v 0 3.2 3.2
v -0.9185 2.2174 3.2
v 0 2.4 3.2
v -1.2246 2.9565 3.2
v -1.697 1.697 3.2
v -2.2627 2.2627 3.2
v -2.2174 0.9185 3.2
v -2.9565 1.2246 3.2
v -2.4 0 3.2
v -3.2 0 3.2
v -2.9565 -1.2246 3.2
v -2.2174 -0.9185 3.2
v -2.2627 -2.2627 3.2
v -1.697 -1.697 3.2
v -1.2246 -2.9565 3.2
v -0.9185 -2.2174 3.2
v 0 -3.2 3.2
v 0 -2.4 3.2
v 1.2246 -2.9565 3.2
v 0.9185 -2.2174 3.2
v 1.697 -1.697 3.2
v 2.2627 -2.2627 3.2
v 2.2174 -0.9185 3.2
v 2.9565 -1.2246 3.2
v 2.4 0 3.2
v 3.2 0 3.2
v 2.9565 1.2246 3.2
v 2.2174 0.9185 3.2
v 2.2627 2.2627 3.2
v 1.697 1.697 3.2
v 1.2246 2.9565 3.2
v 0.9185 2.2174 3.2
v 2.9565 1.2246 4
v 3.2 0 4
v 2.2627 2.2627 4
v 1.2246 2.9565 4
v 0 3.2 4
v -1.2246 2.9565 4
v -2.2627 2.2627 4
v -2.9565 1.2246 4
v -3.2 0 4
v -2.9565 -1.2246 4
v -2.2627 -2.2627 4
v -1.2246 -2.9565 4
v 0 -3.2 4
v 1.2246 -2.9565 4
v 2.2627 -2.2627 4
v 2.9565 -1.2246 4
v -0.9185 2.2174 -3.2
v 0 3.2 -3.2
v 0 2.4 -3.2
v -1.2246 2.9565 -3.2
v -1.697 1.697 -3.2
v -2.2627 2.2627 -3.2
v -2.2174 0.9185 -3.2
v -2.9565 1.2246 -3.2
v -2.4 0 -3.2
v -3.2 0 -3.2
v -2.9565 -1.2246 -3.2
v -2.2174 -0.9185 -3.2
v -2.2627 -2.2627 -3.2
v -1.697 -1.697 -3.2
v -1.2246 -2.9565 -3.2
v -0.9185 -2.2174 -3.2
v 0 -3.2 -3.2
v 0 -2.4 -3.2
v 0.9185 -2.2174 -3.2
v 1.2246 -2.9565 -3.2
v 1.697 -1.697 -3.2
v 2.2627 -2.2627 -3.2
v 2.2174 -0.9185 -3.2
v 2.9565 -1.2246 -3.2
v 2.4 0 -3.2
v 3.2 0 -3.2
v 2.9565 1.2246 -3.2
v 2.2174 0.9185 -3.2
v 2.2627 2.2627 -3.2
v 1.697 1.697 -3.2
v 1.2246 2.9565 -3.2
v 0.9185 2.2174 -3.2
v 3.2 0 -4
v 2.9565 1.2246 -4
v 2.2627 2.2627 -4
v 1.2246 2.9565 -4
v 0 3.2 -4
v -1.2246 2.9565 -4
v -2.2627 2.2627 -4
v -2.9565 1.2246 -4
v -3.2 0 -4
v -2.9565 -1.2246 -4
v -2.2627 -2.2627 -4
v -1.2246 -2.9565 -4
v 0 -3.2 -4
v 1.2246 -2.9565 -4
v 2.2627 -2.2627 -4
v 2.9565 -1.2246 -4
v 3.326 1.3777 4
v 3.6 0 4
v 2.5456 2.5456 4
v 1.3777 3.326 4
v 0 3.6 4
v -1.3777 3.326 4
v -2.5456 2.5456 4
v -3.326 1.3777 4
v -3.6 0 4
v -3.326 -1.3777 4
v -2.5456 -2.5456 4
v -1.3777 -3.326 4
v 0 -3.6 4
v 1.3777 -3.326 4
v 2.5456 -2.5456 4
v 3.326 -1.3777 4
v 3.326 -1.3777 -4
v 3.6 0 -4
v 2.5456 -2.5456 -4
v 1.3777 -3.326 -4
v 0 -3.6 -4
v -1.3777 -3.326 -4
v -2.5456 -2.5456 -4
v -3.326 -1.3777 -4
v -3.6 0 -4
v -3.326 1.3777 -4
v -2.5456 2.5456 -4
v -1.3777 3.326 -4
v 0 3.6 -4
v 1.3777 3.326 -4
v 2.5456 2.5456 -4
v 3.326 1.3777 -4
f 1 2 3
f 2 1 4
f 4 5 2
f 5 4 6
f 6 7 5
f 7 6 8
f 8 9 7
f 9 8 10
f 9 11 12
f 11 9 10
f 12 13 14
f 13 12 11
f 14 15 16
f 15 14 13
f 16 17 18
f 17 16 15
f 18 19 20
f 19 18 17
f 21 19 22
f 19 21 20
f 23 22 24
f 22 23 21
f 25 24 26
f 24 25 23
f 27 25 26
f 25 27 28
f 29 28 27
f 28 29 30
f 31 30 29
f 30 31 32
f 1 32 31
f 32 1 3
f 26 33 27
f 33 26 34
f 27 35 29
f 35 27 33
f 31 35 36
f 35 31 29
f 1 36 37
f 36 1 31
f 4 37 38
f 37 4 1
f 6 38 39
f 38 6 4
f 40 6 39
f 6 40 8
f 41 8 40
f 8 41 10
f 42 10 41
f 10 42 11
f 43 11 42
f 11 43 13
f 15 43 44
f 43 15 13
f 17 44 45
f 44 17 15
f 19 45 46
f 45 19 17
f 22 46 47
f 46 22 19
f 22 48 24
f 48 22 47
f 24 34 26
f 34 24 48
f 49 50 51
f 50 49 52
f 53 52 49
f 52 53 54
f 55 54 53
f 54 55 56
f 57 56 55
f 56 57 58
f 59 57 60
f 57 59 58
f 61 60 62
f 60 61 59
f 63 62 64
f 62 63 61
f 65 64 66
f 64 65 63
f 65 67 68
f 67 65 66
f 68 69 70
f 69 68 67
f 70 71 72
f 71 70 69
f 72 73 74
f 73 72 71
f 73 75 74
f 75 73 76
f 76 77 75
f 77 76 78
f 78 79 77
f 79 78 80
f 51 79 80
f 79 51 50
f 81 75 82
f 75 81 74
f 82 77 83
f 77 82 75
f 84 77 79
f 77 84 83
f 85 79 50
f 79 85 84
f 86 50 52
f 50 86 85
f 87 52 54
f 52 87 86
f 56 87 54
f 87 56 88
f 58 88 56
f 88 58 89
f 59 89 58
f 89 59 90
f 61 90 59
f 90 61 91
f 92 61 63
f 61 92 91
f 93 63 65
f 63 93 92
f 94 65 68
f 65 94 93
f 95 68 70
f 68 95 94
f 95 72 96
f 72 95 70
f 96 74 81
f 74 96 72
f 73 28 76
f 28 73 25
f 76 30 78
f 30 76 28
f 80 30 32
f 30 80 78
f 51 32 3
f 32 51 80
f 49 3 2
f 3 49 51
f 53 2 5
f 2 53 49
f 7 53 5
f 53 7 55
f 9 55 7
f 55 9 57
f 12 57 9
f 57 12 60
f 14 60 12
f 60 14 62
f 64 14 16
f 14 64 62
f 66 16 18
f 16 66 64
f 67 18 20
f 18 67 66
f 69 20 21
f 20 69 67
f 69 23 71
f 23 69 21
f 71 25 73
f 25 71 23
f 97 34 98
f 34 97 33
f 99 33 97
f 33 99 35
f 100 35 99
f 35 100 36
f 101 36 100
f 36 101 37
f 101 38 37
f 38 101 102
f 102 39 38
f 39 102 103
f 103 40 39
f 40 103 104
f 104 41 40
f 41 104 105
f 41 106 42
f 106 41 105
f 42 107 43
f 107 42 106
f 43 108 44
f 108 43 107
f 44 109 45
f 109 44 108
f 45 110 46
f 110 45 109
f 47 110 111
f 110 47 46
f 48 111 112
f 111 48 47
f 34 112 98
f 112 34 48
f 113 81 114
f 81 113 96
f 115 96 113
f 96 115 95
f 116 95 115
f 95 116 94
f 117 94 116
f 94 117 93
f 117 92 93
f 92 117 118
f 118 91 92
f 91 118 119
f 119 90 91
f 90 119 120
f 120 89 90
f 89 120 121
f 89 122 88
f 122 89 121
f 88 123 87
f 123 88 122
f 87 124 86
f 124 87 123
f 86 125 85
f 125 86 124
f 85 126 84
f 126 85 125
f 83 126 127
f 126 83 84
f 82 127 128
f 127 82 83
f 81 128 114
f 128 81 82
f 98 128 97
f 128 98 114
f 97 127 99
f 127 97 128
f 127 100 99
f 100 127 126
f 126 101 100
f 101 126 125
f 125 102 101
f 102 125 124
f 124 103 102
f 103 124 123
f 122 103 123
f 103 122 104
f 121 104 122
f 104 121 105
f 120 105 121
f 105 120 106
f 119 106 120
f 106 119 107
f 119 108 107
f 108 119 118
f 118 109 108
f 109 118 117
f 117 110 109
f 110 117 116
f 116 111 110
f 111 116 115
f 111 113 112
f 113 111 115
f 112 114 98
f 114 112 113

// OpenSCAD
// file: ../p/4-4disc.scad
use <../lib.scad>
$fa=1; $fs=0.2;
function ldraw_lib__4_4disc(realsolid=false) = [
// 0 Disc 1.0
// 0 Name: 4-4disc.dat
// 0 Author: James Jessiman
// 0 !LDRAW_ORG Primitive UPDATE 2002-02
// 0 !LICENSE Licensed under CC BY 2.0 and CC BY 4.0 : see CAreadme.txt
// 
// 0 BFC CERTIFY CCW
  [0,"BFC","CERTIFY"],
  [0,"BFC","CCW"],
// 
// 0 !HISTORY 1998-12-15 [PTadmin] Official Update 1998-10
// 0 !HISTORY 2002-03-23 [sbliss] Added BFC statement
// 0 !HISTORY 2002-04-25 [PTadmin] Official Update 2002-02
// 0 !HISTORY 2007-06-24 [PTadmin] Header formatted for Contributor Agreement
// 0 !HISTORY 2008-07-01 [PTadmin] Official Update 2008-01
// 
// 
// 3 16 0 0 0 1 0 0 0.9239 0 0.3827
  [3,16,0,0,0,1,0,0,0.9239,0,0.3827],
// 3 16 0 0 0 0.9239 0 0.3827 0.7071 0 0.7071
  [3,16,0,0,0,0.9239,0,0.3827,0.7071,0,0.7071],
// 3 16 0 0 0 0.7071 0 0.7071 0.3827 0 0.9239
  [3,16,0,0,0,0.7071,0,0.7071,0.3827,0,0.9239],
// 3 16 0 0 0 0.3827 0 0.9239 0 0 1
  [3,16,0,0,0,0.3827,0,0.9239,0,0,1],
// 3 16 0 0 0 0 0 1 -0.3827 0 0.9239
  [3,16,0,0,0,0,0,1,-0.3827,0,0.9239],
// 3 16 0 0 0 -0.3827 0 0.9239 -0.7071 0 0.7071
  [3,16,0,0,0,-0.3827,0,0.9239,-0.7071,0,0.7071],
// 3 16 0 0 0 -0.7071 0 0.7071 -0.9239 0 0.3827
  [3,16,0,0,0,-0.7071,0,0.7071,-0.9239,0,0.3827],
// 3 16 0 0 0 -0.9239 0 0.3827 -1 0 -0
  [3,16,0,0,0,-0.9239,0,0.3827,-1,0,-0],
// 3 16 0 0 0 -1 0 -0 -0.9239 0 -0.3827
  [3,16,0,0,0,-1,0,-0,-0.9239,0,-0.3827],
// 3 16 0 0 0 -0.9239 0 -0.3827 -0.7071 0 -0.7071
  [3,16,0,0,0,-0.9239,0,-0.3827,-0.7071,0,-0.7071],
// 3 16 0 0 0 -0.7071 0 -0.7071 -0.3827 0 -0.9239
  [3,16,0,0,0,-0.7071,0,-0.7071,-0.3827,0,-0.9239],
// 3 16 0 0 0 -0.3827 0 -0.9239 0 0 -1
  [3,16,0,0,0,-0.3827,0,-0.9239,0,0,-1],
// 3 16 0 0 0 0 0 -1 0.3827 0 -0.9239
  [3,16,0,0,0,0,0,-1,0.3827,0,-0.9239],
// 3 16 0 0 0 0.3827 0 -0.9239 0.7071 0 -0.7071
  [3,16,0,0,0,0.3827,0,-0.9239,0.7071,0,-0.7071],
// 3 16 0 0 0 0.7071 0 -0.7071 0.9239 0 -0.3827
  [3,16,0,0,0,0.7071,0,-0.7071,0.9239,0,-0.3827],
// 3 16 0 0 0 0.9239 0 -0.3827 1 0 0
  [3,16,0,0,0,0.9239,0,-0.3827,1,0,0],
// 0
];
module ldraw_lib__4_4disc(step=0, col=false, unit=2/5, alt=false, line=0.2, solid=!$preview)
    makepoly(ldraw_lib__4_4disc(solid), step=step, col=col, unit=unit, alt=alt, line=line, solid=solid);
ldraw_lib__4_4disc(line=0.2);
// file: ../p/stud3.scad
use <../lib.scad>
use <4-4cyli.scad>
use <4-4disc.scad>
use <4-4edge.scad>
$fa=1; $fs=0.2;
function ldraw_lib__stud3(realsolid=false) = realsolid ? 
    [openscad(translate([0,0,-eps()], o=cylinder(4+eps(), r=4)),2)] : [
// 0 Stud Tube Solid
// 0 Name: stud3.dat
// 0 Author: James Jessiman
// 0 !LDRAW_ORG Primitive UPDATE 2012-01
// 0 !LICENSE Licensed under CC BY 2.0 and CC BY 4.0 : see CAreadme.txt
// 
// 0 BFC CERTIFY CCW
  [0,"BFC","CERTIFY"],
  [0,"BFC","CCW"],
// 
// 0 !HISTORY 2002-04-04 [sbliss] Modified for BFC compliance
// 0 !HISTORY 2002-04-25 [PTadmin] Official Update 2002-02
// 0 !HISTORY 2007-06-24 [PTadmin] Header formatted for Contributor Agreement
// 0 !HISTORY 2008-07-01 [PTadmin] Official Update 2008-01
// 0 !HISTORY 2012-02-16 [Philo] Changed to CCW
// 0 !HISTORY 2012-03-30 [PTadmin] Official Update 2012-01
// 
// 
// 1 16 0 -4 0 4 0 0 0 1 0 0 0 4 4-4edge.dat
  [1,16,0,-4,0,4,0,0,0,1,0,0,0,4, ldraw_lib__4_4edge(realsolid)],
// 1 16 0 0 0 4 0 0 0 1 0 0 0 4 4-4edge.dat
  [1,16,0,0,0,4,0,0,0,1,0,0,0,4, ldraw_lib__4_4edge(realsolid)],
// 1 16 0 -4 0 4 0 0 0 1 0 0 0 4 4-4disc.dat
  [1,16,0,-4,0,4,0,0,0,1,0,0,0,4, ldraw_lib__4_4disc(realsolid)],
// 1 16 0 -4 0 4 0 0 0 4 0 0 0 4 4-4cyli.dat
  [1,16,0,-4,0,4,0,0,0,4,0,0,0,4, ldraw_lib__4_4cyli(realsolid)],
];
module ldraw_lib__stud3(step=0, col=false, unit=2/5, alt=false, line=0.2, solid=!$preview)
    makepoly(ldraw_lib__stud3(solid), step=step, col=col, unit=unit, alt=alt, line=line, solid=solid);
ldraw_lib__stud3(line=0.2);
// file: ../p/stud.scad
use <../lib.scad>
use <4-4cyli.scad>
use <4-4disc.scad>
use <4-4edge.scad>
$fa=1; $fs=0.2;
function ldraw_lib__stud(realsolid=false) = realsolid ? 
    [openscad(translate([0,0,-eps()], o=cylinder(4+eps(), r=6)),2)] : [
// 0 Stud
// 0 Name: stud.dat
// 0 Author: James Jessiman
// 0 !LDRAW_ORG Primitive UPDATE 2012-01
// 0 !LICENSE Licensed under CC BY 2.0 and CC BY 4.0 : see CAreadme.txt
// 
// 0 BFC CERTIFY CCW
  [0,"BFC","CERTIFY"],
  [0,"BFC","CCW"],
// 
// 0 !HISTORY 2002-04-04 [sbliss] Modified for BFC compliance
// 0 !HISTORY 2002-04-25 [PTadmin] Official Update 2002-02
// 0 !HISTORY 2007-06-24 [PTadmin] Header formatted for Contributor Agreement
// 0 !HISTORY 2008-07-01 [PTadmin] Official Update 2008-01
// 0 !HISTORY 2012-02-16 [Philo] Changed to CCW
// 0 !HISTORY 2012-03-30 [PTadmin] Official Update 2012-01
// 
// 
// 1 16 0 0 0 6 0 0 0 1 0 0 0 6 4-4edge.dat
  [1,16,0,0,0,6,0,0,0,1,0,0,0,6, ldraw_lib__4_4edge(realsolid)],
// 1 16 0 -4 0 6 0 0 0 1 0 0 0 6 4-4edge.dat
  [1,16,0,-4,0,6,0,0,0,1,0,0,0,6, ldraw_lib__4_4edge(realsolid)],
// 1 16 0 0 0 6 0 0 0 -4 0 0 0 6 4-4cyli.dat
  [1,16,0,0,0,6,0,0,0,-4,0,0,0,6, ldraw_lib__4_4cyli(realsolid)],
// 1 16 0 -4 0 6 0 0 0 1 0 0 0 6 4-4disc.dat
  [1,16,0,-4,0,6,0,0,0,1,0,0,0,6, ldraw_lib__4_4disc(realsolid)],
];
module ldraw_lib__stud(step=0, col=false, unit=2/5, alt=false, line=0.2, solid=!$preview)
    makepoly(ldraw_lib__stud(solid), step=step, col=col, unit=unit, alt=alt, line=line, solid=solid);
ldraw_lib__stud(line=0.2);
// file: ../p/box5.scad
use <../lib.scad>
$fa=1; $fs=0.2;
function ldraw_lib__box5(realsolid=false) = [
// 0 Box with 5 Faces and All Edges
// 0 Name: box5.dat
// 0 Author: James Jessiman
// 0 !LDRAW_ORG Primitive UPDATE 2012-01
// 0 !LICENSE Licensed under CC BY 2.0 and CC BY 4.0 : see CAreadme.txt
// 
// 0 BFC CERTIFY CCW
  [0,"BFC","CERTIFY"],
  [0,"BFC","CCW"],
// 
// 0 !HISTORY 2002-04-03 [sbliss] Modified for BFC compliance
// 0 !HISTORY 2002-04-25 [PTadmin] Official Update 2002-02
// 0 !HISTORY 2007-06-24 [PTadmin] Header formatted for Contributor Agreement
// 0 !HISTORY 2008-07-01 [PTadmin] Official Update 2008-01
// 0 !HISTORY 2012-02-16 [Philo] Changed to CCW
// 0 !HISTORY 2012-03-30 [PTadmin] Official Update 2012-01
// 
// 
// 2 24 1 1 1 -1 1 1
  [2,24,1,1,1,-1,1,1],
// 2 24 -1 1 1 -1 1 -1
  [2,24,-1,1,1,-1,1,-1],
// 2 24 -1 1 -1 1 1 -1
  [2,24,-1,1,-1,1,1,-1],
// 2 24 1 1 -1 1 1 1
  [2,24,1,1,-1,1,1,1],
// 2 24 1 0 1 -1 0 1
  [2,24,1,0,1,-1,0,1],
// 2 24 -1 0 1 -1 0 -1
  [2,24,-1,0,1,-1,0,-1],
// 2 24 -1 0 -1 1 0 -1
  [2,24,-1,0,-1,1,0,-1],
// 2 24 1 0 -1 1 0 1
  [2,24,1,0,-1,1,0,1],
// 2 24 1 0 1 1 1 1
  [2,24,1,0,1,1,1,1],
// 2 24 -1 0 1 -1 1 1
  [2,24,-1,0,1,-1,1,1],
// 2 24 1 0 -1 1 1 -1
  [2,24,1,0,-1,1,1,-1],
// 2 24 -1 0 -1 -1 1 -1
  [2,24,-1,0,-1,-1,1,-1],
// 4 16 -1 1 1 1 1 1 1 1 -1 -1 1 -1
  [4,16,-1,1,1,1,1,1,1,1,-1,-1,1,-1],
// 4 16 -1 1 1 -1 0 1 1 0 1 1 1 1
  [4,16,-1,1,1,-1,0,1,1,0,1,1,1,1],
// 4 16 -1 1 -1 -1 0 -1 -1 0 1 -1 1 1
  [4,16,-1,1,-1,-1,0,-1,-1,0,1,-1,1,1],
// 4 16 1 1 -1 1 0 -1 -1 0 -1 -1 1 -1
  [4,16,1,1,-1,1,0,-1,-1,0,-1,-1,1,-1],
// 4 16 1 1 1 1 0 1 1 0 -1 1 1 -1
  [4,16,1,1,1,1,0,1,1,0,-1,1,1,-1],
];
module ldraw_lib__box5(step=0, col=false, unit=2/5, alt=false, line=0.2, solid=!$preview)
    makepoly(ldraw_lib__box5(solid), step=step, col=col, unit=unit, alt=alt, line=line, solid=solid);
ldraw_lib__box5(line=0.2);
// file: ../p/box4t.scad
use <../lib.scad>
$fa=1; $fs=0.2;
function ldraw_lib__box4t(realsolid=false) = [
// 0 Box with 4 Adjacent Faces and All Edges
// 0 Name: box4t.dat
// 0 Author: Tore Eriksson [Tore_Eriksson]
// 0 !LDRAW_ORG Primitive UPDATE 2003-02
// 0 !LICENSE Licensed under CC BY 2.0 and CC BY 4.0 : see CAreadme.txt
// 
// 0 BFC CERTIFY CCW
  [0,"BFC","CERTIFY"],
  [0,"BFC","CCW"],
// 
// 0 !HISTORY 1997-09-29 [PTadmin] Official Update 1997-15
// 0 !HISTORY 2002-08-31 [izanette] Modified with WINDZ for BFC compliance
// 0 !HISTORY 2003-08-01 [PTadmin] Official Update 2003-02
// 0 !HISTORY 2007-06-24 [PTadmin] Header formatted for Contributor Agreement
// 0 !HISTORY 2008-07-01 [PTadmin] Official Update 2008-01
// 
// 
// 2 24 1 1 1 -1 1 1
  [2,24,1,1,1,-1,1,1],
// 2 24 -1 1 1 -1 1 -1
  [2,24,-1,1,1,-1,1,-1],
// 2 24 -1 1 -1 1 1 -1
  [2,24,-1,1,-1,1,1,-1],
// 2 24 1 1 -1 1 1 1
  [2,24,1,1,-1,1,1,1],
// 2 24 1 0 1 -1 0 1
  [2,24,1,0,1,-1,0,1],
// 2 24 -1 0 1 -1 0 -1
  [2,24,-1,0,1,-1,0,-1],
// 2 24 -1 0 -1 1 0 -1
  [2,24,-1,0,-1,1,0,-1],
// 2 24 1 0 -1 1 0 1
  [2,24,1,0,-1,1,0,1],
// 2 24 1 0 1 1 1 1
  [2,24,1,0,1,1,1,1],
// 2 24 -1 0 1 -1 1 1
  [2,24,-1,0,1,-1,1,1],
// 2 24 1 0 -1 1 1 -1
  [2,24,1,0,-1,1,1,-1],
// 2 24 -1 0 -1 -1 1 -1
  [2,24,-1,0,-1,-1,1,-1],
// 4 16 1 1 1 1 1 -1 -1 1 -1 -1 1 1
  [4,16,1,1,1,1,1,-1,-1,1,-1,-1,1,1],
// 4 16 1 1 1 -1 1 1 -1 0 1 1 0 1
  [4,16,1,1,1,-1,1,1,-1,0,1,1,0,1],
// 4 16 -1 1 1 -1 1 -1 -1 0 -1 -1 0 1
  [4,16,-1,1,1,-1,1,-1,-1,0,-1,-1,0,1],
// 0 4 16 -1 1 -1 -1 0 -1 1 0 -1 1 1 -1
// 4 16 1 1 -1 1 1 1 1 0 1 1 0 -1
  [4,16,1,1,-1,1,1,1,1,0,1,1,0,-1],
// 0
];
module ldraw_lib__box4t(step=0, col=false, unit=2/5, alt=false, line=0.2, solid=!$preview)
    makepoly(ldraw_lib__box4t(solid), step=step, col=col, unit=unit, alt=alt, line=line, solid=solid);
ldraw_lib__box4t(line=0.2);
// file: ../p/4-4ring3.scad
use <../lib.scad>
$fa=1; $fs=0.2;
function ldraw_lib__4_4ring3(realsolid=false) = [
// 0 Ring  3 x 1.0
// 0 Name: 4-4ring3.dat
// 0 Author: James Jessiman
// 0 !LDRAW_ORG Primitive UPDATE 2009-01
// 0 !LICENSE Licensed under CC BY 2.0 and CC BY 4.0 : see CAreadme.txt
// 
// 0 BFC CERTIFY CCW
  [0,"BFC","CERTIFY"],
  [0,"BFC","CCW"],
// 
// 0 !HISTORY 1998-12-15 [PTadmin] Official Update 1998-10
// 0 !HISTORY 2002-04-05 [hafhead] Added BFC statement
// 0 !HISTORY 2002-04-25 [PTadmin] Official Update 2002-02
// 0 !HISTORY 2007-06-24 [PTadmin] Header formatted for Contributor Agreement
// 0 !HISTORY 2008-07-01 [PTadmin] Official Update 2008-01
// 0 !HISTORY 2008-08-26 [cwdee] Switch polygon winding and rename
// 0 !HISTORY 2009-05-02 [PTadmin] Official Update 2009-01
// 
// 
// 4 16 -1.5308 0 3.6956 -1.1481 0 2.7717 0 0 3 0 0 4
  [4,16,-1.5308,0,3.6956,-1.1481,0,2.7717,0,0,3,0,0,4],
// 4 16 -2.8284 0 2.8284 -2.1213 0 2.1213 -1.1481 0 2.7717 -1.5308 0 3.6956
  [4,16,-2.8284,0,2.8284,-2.1213,0,2.1213,-1.1481,0,2.7717,-1.5308,0,3.6956],
// 4 16 -3.6956 0 1.5308 -2.7717 0 1.1481 -2.1213 0 2.1213 -2.8284 0 2.8284
  [4,16,-3.6956,0,1.5308,-2.7717,0,1.1481,-2.1213,0,2.1213,-2.8284,0,2.8284],
// 4 16 -4 0 0 -3 0 0 -2.7717 0 1.1481 -3.6956 0 1.5308
  [4,16,-4,0,0,-3,0,0,-2.7717,0,1.1481,-3.6956,0,1.5308],
// 4 16 -3.6956 0 -1.5308 -2.7717 0 -1.1481 -3 0 0 -4 0 0
  [4,16,-3.6956,0,-1.5308,-2.7717,0,-1.1481,-3,0,0,-4,0,0],
// 4 16 -2.8284 0 -2.8284 -2.1213 0 -2.1213 -2.7717 0 -1.1481 -3.6956 0 -1.5308
  [4,16,-2.8284,0,-2.8284,-2.1213,0,-2.1213,-2.7717,0,-1.1481,-3.6956,0,-1.5308],
// 4 16 -1.5308 0 -3.6956 -1.1481 0 -2.7717 -2.1213 0 -2.1213 -2.8284 0 -2.8284
  [4,16,-1.5308,0,-3.6956,-1.1481,0,-2.7717,-2.1213,0,-2.1213,-2.8284,0,-2.8284],
// 4 16 0 0 -4 0 0 -3 -1.1481 0 -2.7717 -1.5308 0 -3.6956
  [4,16,0,0,-4,0,0,-3,-1.1481,0,-2.7717,-1.5308,0,-3.6956],
// 4 16 1.5308 0 -3.6956 1.1481 0 -2.7717 0 0 -3 0 0 -4
  [4,16,1.5308,0,-3.6956,1.1481,0,-2.7717,0,0,-3,0,0,-4],
// 4 16 2.8284 0 -2.8284 2.1213 0 -2.1213 1.1481 0 -2.7717 1.5308 0 -3.6956
  [4,16,2.8284,0,-2.8284,2.1213,0,-2.1213,1.1481,0,-2.7717,1.5308,0,-3.6956],
// 4 16 3.6956 0 -1.5308 2.7717 0 -1.1481 2.1213 0 -2.1213 2.8284 0 -2.8284
  [4,16,3.6956,0,-1.5308,2.7717,0,-1.1481,2.1213,0,-2.1213,2.8284,0,-2.8284],
// 4 16 4 0 0 3 0 0 2.7717 0 -1.1481 3.6956 0 -1.5308
  [4,16,4,0,0,3,0,0,2.7717,0,-1.1481,3.6956,0,-1.5308],
// 4 16 3.6956 0 1.5308 2.7717 0 1.1481 3 0 0 4 0 0
  [4,16,3.6956,0,1.5308,2.7717,0,1.1481,3,0,0,4,0,0],
// 4 16 2.8284 0 2.8284 2.1213 0 2.1213 2.7717 0 1.1481 3.6956 0 1.5308
  [4,16,2.8284,0,2.8284,2.1213,0,2.1213,2.7717,0,1.1481,3.6956,0,1.5308],
// 4 16 1.5308 0 3.6956 1.1481 0 2.7717 2.1213 0 2.1213 2.8284 0 2.8284
  [4,16,1.5308,0,3.6956,1.1481,0,2.7717,2.1213,0,2.1213,2.8284,0,2.8284],
// 4 16 0 0 4 0 0 3 1.1481 0 2.7717 1.5308 0 3.6956
  [4,16,0,0,4,0,0,3,1.1481,0,2.7717,1.5308,0,3.6956],
// 0
];
module ldraw_lib__4_4ring3(step=0, col=false, unit=2/5, alt=false, line=0.2, solid=!$preview)
    makepoly(ldraw_lib__4_4ring3(solid), step=step, col=col, unit=unit, alt=alt, line=line, solid=solid);
ldraw_lib__4_4ring3(line=0.2);
// file: s/3004s01.scad
use <../../lib.scad>
use <../../p/box4t.scad>
use <../../p/box5.scad>
use <../../p/stud.scad>
use <../../p/stud3.scad>
$fa=1; $fs=0.2;
function ldraw_lib__s__3004s01(realsolid=false) = [
// 0 ~Brick  1 x  2 without Front Face
// 0 Name: s\3004s01.dat
// 0 Author: James Jessiman
// 0 !LDRAW_ORG Subpart UPDATE 2003-03
// 0 !LICENSE Licensed under CC BY 2.0 and CC BY 4.0 : see CAreadme.txt
// 
// 0 BFC CERTIFY CCW
  [0,"BFC","CERTIFY"],
  [0,"BFC","CCW"],
// 
// 0 !HISTORY 2003-09-07 [jriley] Subfiling, BFC
// 0 !HISTORY 2003-12-19 [PTadmin] Official Update 2003-03
// 0 !HISTORY 2007-08-29 [PTadmin] Header formatted for Contributor Agreement
// 0 !HISTORY 2008-07-01 [PTadmin] Official Update 2008-01
// 
// 
// 1 16 0 4 0 1 0 0 0 -5 0 0 0 1 stud3.dat
  [1,16,0,4,0,1,0,0,0,-5,0,0,0,1, ldraw_lib__stud3(realsolid)],
// 0 BFC INVERTNEXT
  [0,"BFC","INVERTNEXT"],
// 1 16 0 24 0 16 0 0 0 -20 0 0 0 6 box5.dat
  [1,16,0,24,0,16,0,0,0,-20,0,0,0,6, ldraw_lib__box5(realsolid)],
// 4 16 20 24 10 16 24 6 -16 24 6 -20 24 10
  [4,16,20,24,10,16,24,6,-16,24,6,-20,24,10],
// 4 16 -20 24 10 -16 24 6 -16 24 -6 -20 24 -10
  [4,16,-20,24,10,-16,24,6,-16,24,-6,-20,24,-10],
// 4 16 -20 24 -10 -16 24 -6 16 24 -6 20 24 -10
  [4,16,-20,24,-10,-16,24,-6,16,24,-6,20,24,-10],
// 4 16 20 24 -10 16 24 -6 16 24 6 20 24 10
  [4,16,20,24,-10,16,24,-6,16,24,6,20,24,10],
// 1 16 0 24 0 20 0 0 0 -24 0 0 0 10 box4t.dat
  [1,16,0,24,0,20,0,0,0,-24,0,0,0,10, ldraw_lib__box4t(realsolid)],
// 1 16 10 0 0 1 0 0 0 1 0 0 0 1 stud.dat
  [1,16,10,0,0,1,0,0,0,1,0,0,0,1, ldraw_lib__stud(realsolid)],
// 1 16 -10 0 0 1 0 0 0 1 0 0 0 1 stud.dat
  [1,16,-10,0,0,1,0,0,0,1,0,0,0,1, ldraw_lib__stud(realsolid)],
// 0
];
module ldraw_lib__s__3004s01(step=0, col=false, unit=2/5, alt=false, line=0.2, solid=!$preview)
    makepoly(ldraw_lib__s__3004s01(solid), step=step, col=col, unit=unit, alt=alt, line=line, solid=solid);
ldraw_lib__s__3004s01(line=0.2);
// file: ../p/peghole.scad
use <../lib.scad>
use <4-4cyli.scad>
use <4-4edge.scad>
use <4-4ring3.scad>
$fa=1; $fs=0.2;
function ldraw_lib__peghole(realsolid=false) = [
// 0 Peg Hole End
// 0 Name: peghole.dat
// 0 Author: James Jessiman
// 0 !LDRAW_ORG Primitive UPDATE 2010-01
// 0 !LICENSE Licensed under CC BY 2.0 and CC BY 4.0 : see CAreadme.txt
// 
// 0 BFC CERTIFY CCW
  [0,"BFC","CERTIFY"],
  [0,"BFC","CCW"],
// 
// 0 !HISTORY 2002-05-01 [mkennedy] replace code with ring3
// 0 !HISTORY 2002-05-01 [sbliss] BFC
// 0 !HISTORY 2002-06-11 [PTadmin] Official Update 2002-03
// 0 !HISTORY 2007-06-24 [PTadmin] Header formatted for Contributor Agreement
// 0 !HISTORY 2008-07-01 [PTadmin] Official Update 2008-01
// 0 !HISTORY 2010-01-14 [cwdee] Update ring3 to 4-4ring3
// 0 !HISTORY 2010-04-05 [PTadmin] Official Update 2010-01
// 
// 
// 1 16 0 0 0 8 0 0 0 1 0 0 0 8 4-4edge.dat
  [1,16,0,0,0,8,0,0,0,1,0,0,0,8, ldraw_lib__4_4edge(realsolid)],
// 1 16 0 2 0 8 0 0 0 1 0 0 0 8 4-4edge.dat
  [1,16,0,2,0,8,0,0,0,1,0,0,0,8, ldraw_lib__4_4edge(realsolid)],
// 1 16 0 2 0 6 0 0 0 1 0 0 0 6 4-4edge.dat
  [1,16,0,2,0,6,0,0,0,1,0,0,0,6, ldraw_lib__4_4edge(realsolid)],
// 1 16 0 2 0 2 0 0 0 1 0 0 0 2 4-4ring3.dat
  [1,16,0,2,0,2,0,0,0,1,0,0,0,2, ldraw_lib__4_4ring3(realsolid)],
// 0 BFC INVERTNEXT
  [0,"BFC","INVERTNEXT"],
// 1 16 0 0 0 8 0 0 0 2 0 0 0 8 4-4cyli.dat
  [1,16,0,0,0,8,0,0,0,2,0,0,0,8, ldraw_lib__4_4cyli(realsolid)],
// 0
];
module ldraw_lib__peghole(step=0, col=false, unit=2/5, alt=false, line=0.2, solid=!$preview)
    makepoly(ldraw_lib__peghole(solid), step=step, col=col, unit=unit, alt=alt, line=line, solid=solid);
ldraw_lib__peghole(line=0.2);
// file: ../p/4-4ring8.scad
use <../lib.scad>
$fa=1; $fs=0.2;
function ldraw_lib__4_4ring8(realsolid=false) = [
// 0 Ring  8 x 1.0
// 0 Name: 4-4ring8.dat
// 0 Author: Steffen [Steffen]
// 0 !LDRAW_ORG Primitive UPDATE 2012-01
// 0 !LICENSE Licensed under CC BY 2.0 and CC BY 4.0 : see CAreadme.txt
// 
// 0 BFC CERTIFY CCW
  [0,"BFC","CERTIFY"],
  [0,"BFC","CCW"],
// 
// 0 !HISTORY 2003-12-19 [PTadmin] Official Update 2003-03
// 0 !HISTORY 2007-06-24 [PTadmin] Header formatted for Contributor Agreement
// 0 !HISTORY 2008-07-01 [PTadmin] Official Update 2008-01
// 0 !HISTORY 2012-02-16 [Philo] Changed to CCW
// 0 !HISTORY 2012-03-30 [PTadmin] Official Update 2012-01
// 
// 
// 4 16 9 0 0 8.3151 0 3.4443 7.3912 0 3.0616 8 0 0
  [4,16,9,0,0,8.3151,0,3.4443,7.3912,0,3.0616,8,0,0],
// 4 16 8.3151 0 3.4443 6.3639 0 6.3639 5.6568 0 5.6568 7.3912 0 3.0616
  [4,16,8.3151,0,3.4443,6.3639,0,6.3639,5.6568,0,5.6568,7.3912,0,3.0616],
// 4 16 6.3639 0 6.3639 3.4443 0 8.3151 3.0616 0 7.3912 5.6568 0 5.6568
  [4,16,6.3639,0,6.3639,3.4443,0,8.3151,3.0616,0,7.3912,5.6568,0,5.6568],
// 4 16 3.4443 0 8.3151 0 0 9 0 0 8 3.0616 0 7.3912
  [4,16,3.4443,0,8.3151,0,0,9,0,0,8,3.0616,0,7.3912],
// 4 16 0 0 9 -3.4443 0 8.3151 -3.0616 0 7.3912 0 0 8
  [4,16,0,0,9,-3.4443,0,8.3151,-3.0616,0,7.3912,0,0,8],
// 4 16 -3.4443 0 8.3151 -6.3639 0 6.3639 -5.6568 0 5.6568 -3.0616 0 7.3912
  [4,16,-3.4443,0,8.3151,-6.3639,0,6.3639,-5.6568,0,5.6568,-3.0616,0,7.3912],
// 4 16 -6.3639 0 6.3639 -8.3151 0 3.4443 -7.3912 0 3.0616 -5.6568 0 5.6568
  [4,16,-6.3639,0,6.3639,-8.3151,0,3.4443,-7.3912,0,3.0616,-5.6568,0,5.6568],
// 4 16 -8.3151 0 3.4443 -9 0 0 -8 0 0 -7.3912 0 3.0616
  [4,16,-8.3151,0,3.4443,-9,0,0,-8,0,0,-7.3912,0,3.0616],
// 4 16 -9 0 0 -8.3151 0 -3.4443 -7.3912 0 -3.0616 -8 0 0
  [4,16,-9,0,0,-8.3151,0,-3.4443,-7.3912,0,-3.0616,-8,0,0],
// 4 16 -8.3151 0 -3.4443 -6.3639 0 -6.3639 -5.6568 0 -5.6568 -7.3912 0 -3.0616
  [4,16,-8.3151,0,-3.4443,-6.3639,0,-6.3639,-5.6568,0,-5.6568,-7.3912,0,-3.0616],
// 4 16 -6.3639 0 -6.3639 -3.4443 0 -8.3151 -3.0616 0 -7.3912 -5.6568 0 -5.6568
  [4,16,-6.3639,0,-6.3639,-3.4443,0,-8.3151,-3.0616,0,-7.3912,-5.6568,0,-5.6568],
// 4 16 -3.4443 0 -8.3151 0 0 -9 0 0 -8 -3.0616 0 -7.3912
  [4,16,-3.4443,0,-8.3151,0,0,-9,0,0,-8,-3.0616,0,-7.3912],
// 4 16 0 0 -9 3.4443 0 -8.3151 3.0616 0 -7.3912 0 0 -8
  [4,16,0,0,-9,3.4443,0,-8.3151,3.0616,0,-7.3912,0,0,-8],
// 4 16 3.4443 0 -8.3151 6.3639 0 -6.3639 5.6568 0 -5.6568 3.0616 0 -7.3912
  [4,16,3.4443,0,-8.3151,6.3639,0,-6.3639,5.6568,0,-5.6568,3.0616,0,-7.3912],
// 4 16 6.3639 0 -6.3639 8.3151 0 -3.4443 7.3912 0 -3.0616 5.6568 0 -5.6568
  [4,16,6.3639,0,-6.3639,8.3151,0,-3.4443,7.3912,0,-3.0616,5.6568,0,-5.6568],
// 4 16 8.3151 0 -3.4443 9 0 0 8 0 0 7.3912 0 -3.0616
  [4,16,8.3151,0,-3.4443,9,0,0,8,0,0,7.3912,0,-3.0616],
];
module ldraw_lib__4_4ring8(step=0, col=false, unit=2/5, alt=false, line=0.2, solid=!$preview)
    makepoly(ldraw_lib__4_4ring8(solid), step=step, col=col, unit=unit, alt=alt, line=line, solid=solid);
ldraw_lib__4_4ring8(line=0.2);
// file: ../p/4-4edge.scad
use <../lib.scad>
$fa=1; $fs=0.2;
function ldraw_lib__4_4edge(realsolid=false) = [
// 0 Circle 1.0
// 0 Name: 4-4edge.dat
// 0 Author: James Jessiman
// 0 !LDRAW_ORG Primitive UPDATE 2017-01
// 0 !LICENSE Licensed under CC BY 2.0 and CC BY 4.0 : see CAreadme.txt
// 
// 0 BFC CERTIFY CCW
  [0,"BFC","CERTIFY"],
  [0,"BFC","CCW"],
// 
// 0 !HISTORY 1998-12-15 [PTadmin] Official Update 1998-10
// 0 !HISTORY 2005-12-28 [PTadmin] Official Update 2005-01
// 0 !HISTORY 2007-06-24 [PTadmin] Header formatted for Contributor Agreement
// 0 !HISTORY 2008-07-01 [PTadmin] Official Update 2008-01
// 0 !HISTORY 2017-01-15 [Steffen] BFCed
// 0 !HISTORY 2017-12-30 [PTadmin] Official Update 2017-01
// 
// 
// 2 24 1 0 0 0.9239 0 0.3827
  [2,24,1,0,0,0.9239,0,0.3827],
// 2 24 0.9239 0 0.3827 0.7071 0 0.7071
  [2,24,0.9239,0,0.3827,0.7071,0,0.7071],
// 2 24 0.7071 0 0.7071 0.3827 0 0.9239
  [2,24,0.7071,0,0.7071,0.3827,0,0.9239],
// 2 24 0.3827 0 0.9239 0 0 1
  [2,24,0.3827,0,0.9239,0,0,1],
// 2 24 0 0 1 -0.3827 0 0.9239
  [2,24,0,0,1,-0.3827,0,0.9239],
// 2 24 -0.3827 0 0.9239 -0.7071 0 0.7071
  [2,24,-0.3827,0,0.9239,-0.7071,0,0.7071],
// 2 24 -0.7071 0 0.7071 -0.9239 0 0.3827
  [2,24,-0.7071,0,0.7071,-0.9239,0,0.3827],
// 2 24 -0.9239 0 0.3827 -1 0 -0
  [2,24,-0.9239,0,0.3827,-1,0,-0],
// 2 24 -1 0 -0 -0.9239 0 -0.3827
  [2,24,-1,0,-0,-0.9239,0,-0.3827],
// 2 24 -0.9239 0 -0.3827 -0.7071 0 -0.7071
  [2,24,-0.9239,0,-0.3827,-0.7071,0,-0.7071],
// 2 24 -0.7071 0 -0.7071 -0.3827 0 -0.9239
  [2,24,-0.7071,0,-0.7071,-0.3827,0,-0.9239],
// 2 24 -0.3827 0 -0.9239 0 0 -1
  [2,24,-0.3827,0,-0.9239,0,0,-1],
// 2 24 0 0 -1 0.3827 0 -0.9239
  [2,24,0,0,-1,0.3827,0,-0.9239],
// 2 24 0.3827 0 -0.9239 0.7071 0 -0.7071
  [2,24,0.3827,0,-0.9239,0.7071,0,-0.7071],
// 2 24 0.7071 0 -0.7071 0.9239 0 -0.3827
  [2,24,0.7071,0,-0.7071,0.9239,0,-0.3827],
// 2 24 0.9239 0 -0.3827 1 0 0
  [2,24,0.9239,0,-0.3827,1,0,0],
];
module ldraw_lib__4_4edge(step=0, col=false, unit=2/5, alt=false, line=0.2, solid=!$preview)
    makepoly(ldraw_lib__4_4edge(solid), step=step, col=col, unit=unit, alt=alt, line=line, solid=solid);
ldraw_lib__4_4edge(line=0.2);
// file: ../p/4-4cyli.scad
use <../lib.scad>
$fa=1; $fs=0.2;
function ldraw_lib__4_4cyli(realsolid=false) = [
// 0 Cylinder 1.0
// 0 Name: 4-4cyli.dat
// 0 Author: James Jessiman
// 0 !LDRAW_ORG Primitive UPDATE 2005-01
// 0 !LICENSE Licensed under CC BY 2.0 and CC BY 4.0 : see CAreadme.txt
// 
// 0 BFC CERTIFY CCW
  [0,"BFC","CERTIFY"],
  [0,"BFC","CCW"],
// 
// 0 !HISTORY 1998-12-15 [PTadmin] Official Update 1998-10
// 0 !HISTORY 2002-03-23 [sbliss] Added BFC statement; merged headers from files in distributions LDraw 0.27 and Complete.
// 0 !HISTORY 2002-04-25 [PTadmin] Official Update 2002-02
// 0 !HISTORY 2004-12-14 [guyvivan] BFC CCW
// 0 !HISTORY 2005-12-28 [PTadmin] Official Update 2005-01
// 0 !HISTORY 2007-06-24 [PTadmin] Header formatted for Contributor Agreement
// 0 !HISTORY 2008-07-01 [PTadmin] Official Update 2008-01
// 
// 
// 4 16 1 1 0 0.9239 1 0.3827 0.9239 0 0.3827 1 0 0
  [4,16,1,1,0,0.9239,1,0.3827,0.9239,0,0.3827,1,0,0],
// 5 24 1 0 0 1 1 0 0.9239 0 0.3827 0.9239 0 -0.3827
  [5,24,1,0,0,1,1,0,0.9239,0,0.3827,0.9239,0,-0.3827],
// 4 16 0.9239 1 0.3827 0.7071 1 0.7071 0.7071 0 0.7071 0.9239 0 0.3827
  [4,16,0.9239,1,0.3827,0.7071,1,0.7071,0.7071,0,0.7071,0.9239,0,0.3827],
// 5 24 0.9239 0 0.3827 0.9239 1 0.3827 0.7071 0 0.7071 1 0 0
  [5,24,0.9239,0,0.3827,0.9239,1,0.3827,0.7071,0,0.7071,1,0,0],
// 4 16 0.7071 1 0.7071 0.3827 1 0.9239 0.3827 0 0.9239 0.7071 0 0.7071
  [4,16,0.7071,1,0.7071,0.3827,1,0.9239,0.3827,0,0.9239,0.7071,0,0.7071],
// 5 24 0.7071 0 0.7071 0.7071 1 0.7071 0.3827 0 0.9239 0.9239 0 0.3827
  [5,24,0.7071,0,0.7071,0.7071,1,0.7071,0.3827,0,0.9239,0.9239,0,0.3827],
// 4 16 0.3827 1 0.9239 0 1 1 0 0 1 0.3827 0 0.9239
  [4,16,0.3827,1,0.9239,0,1,1,0,0,1,0.3827,0,0.9239],
// 5 24 0.3827 0 0.9239 0.3827 1 0.9239 0 0 1 0.7071 0 0.7071
  [5,24,0.3827,0,0.9239,0.3827,1,0.9239,0,0,1,0.7071,0,0.7071],
// 4 16 0 1 1 -0.3827 1 0.9239 -0.3827 0 0.9239 0 0 1
  [4,16,0,1,1,-0.3827,1,0.9239,-0.3827,0,0.9239,0,0,1],
// 5 24 0 0 1 0 1 1 -0.3827 0 0.9239 0.3827 0 0.9239
  [5,24,0,0,1,0,1,1,-0.3827,0,0.9239,0.3827,0,0.9239],
// 4 16 -0.3827 1 0.9239 -0.7071 1 0.7071 -0.7071 0 0.7071 -0.3827 0 0.9239
  [4,16,-0.3827,1,0.9239,-0.7071,1,0.7071,-0.7071,0,0.7071,-0.3827,0,0.9239],
// 5 24 -0.3827 0 0.9239 -0.3827 1 0.9239 -0.7071 0 0.7071 0 0 1
  [5,24,-0.3827,0,0.9239,-0.3827,1,0.9239,-0.7071,0,0.7071,0,0,1],
// 4 16 -0.7071 1 0.7071 -0.9239 1 0.3827 -0.9239 0 0.3827 -0.7071 0 0.7071
  [4,16,-0.7071,1,0.7071,-0.9239,1,0.3827,-0.9239,0,0.3827,-0.7071,0,0.7071],
// 5 24 -0.7071 0 0.7071 -0.7071 1 0.7071 -0.9239 0 0.3827 -0.3827 0 0.9239
  [5,24,-0.7071,0,0.7071,-0.7071,1,0.7071,-0.9239,0,0.3827,-0.3827,0,0.9239],
// 4 16 -0.9239 1 0.3827 -1 1 0 -1 0 0 -0.9239 0 0.3827
  [4,16,-0.9239,1,0.3827,-1,1,0,-1,0,0,-0.9239,0,0.3827],
// 5 24 -0.9239 0 0.3827 -0.9239 1 0.3827 -1 0 0 -0.7071 0 0.7071
  [5,24,-0.9239,0,0.3827,-0.9239,1,0.3827,-1,0,0,-0.7071,0,0.7071],
// 4 16 -1 1 0 -0.9239 1 -0.3827 -0.9239 0 -0.3827 -1 0 0
  [4,16,-1,1,0,-0.9239,1,-0.3827,-0.9239,0,-0.3827,-1,0,0],
// 5 24 -1 0 0 -1 1 0 -0.9239 0 -0.3827 -0.9239 0 0.3827
  [5,24,-1,0,0,-1,1,0,-0.9239,0,-0.3827,-0.9239,0,0.3827],
// 4 16 -0.9239 1 -0.3827 -0.7071 1 -0.7071 -0.7071 0 -0.7071 -0.9239 0 -0.3827
  [4,16,-0.9239,1,-0.3827,-0.7071,1,-0.7071,-0.7071,0,-0.7071,-0.9239,0,-0.3827],
// 5 24 -0.9239 0 -0.3827 -0.9239 1 -0.3827 -0.7071 0 -0.7071 -1 0 0
  [5,24,-0.9239,0,-0.3827,-0.9239,1,-0.3827,-0.7071,0,-0.7071,-1,0,0],
// 4 16 -0.7071 1 -0.7071 -0.3827 1 -0.9239 -0.3827 0 -0.9239 -0.7071 0 -0.7071
  [4,16,-0.7071,1,-0.7071,-0.3827,1,-0.9239,-0.3827,0,-0.9239,-0.7071,0,-0.7071],
// 5 24 -0.7071 0 -0.7071 -0.7071 1 -0.7071 -0.3827 0 -0.9239 -0.9239 0 -0.3827
  [5,24,-0.7071,0,-0.7071,-0.7071,1,-0.7071,-0.3827,0,-0.9239,-0.9239,0,-0.3827],
// 4 16 -0.3827 1 -0.9239 0 1 -1 0 0 -1 -0.3827 0 -0.9239
  [4,16,-0.3827,1,-0.9239,0,1,-1,0,0,-1,-0.3827,0,-0.9239],
// 5 24 -0.3827 0 -0.9239 -0.3827 1 -0.9239 0 0 -1 -0.7071 0 -0.7071
  [5,24,-0.3827,0,-0.9239,-0.3827,1,-0.9239,0,0,-1,-0.7071,0,-0.7071],
// 4 16 0 1 -1 0.3827 1 -0.9239 0.3827 0 -0.9239 0 0 -1
  [4,16,0,1,-1,0.3827,1,-0.9239,0.3827,0,-0.9239,0,0,-1],
// 5 24 0 0 -1 0 1 -1 0.3827 0 -0.9239 -0.3827 0 -0.9239
  [5,24,0,0,-1,0,1,-1,0.3827,0,-0.9239,-0.3827,0,-0.9239],
// 4 16 0.3827 1 -0.9239 0.7071 1 -0.7071 0.7071 0 -0.7071 0.3827 0 -0.9239
  [4,16,0.3827,1,-0.9239,0.7071,1,-0.7071,0.7071,0,-0.7071,0.3827,0,-0.9239],
// 5 24 0.3827 0 -0.9239 0.3827 1 -0.9239 0.7071 0 -0.7071 0 0 -1
  [5,24,0.3827,0,-0.9239,0.3827,1,-0.9239,0.7071,0,-0.7071,0,0,-1],
// 4 16 0.7071 1 -0.7071 0.9239 1 -0.3827 0.9239 0 -0.3827 0.7071 0 -0.7071
  [4,16,0.7071,1,-0.7071,0.9239,1,-0.3827,0.9239,0,-0.3827,0.7071,0,-0.7071],
// 5 24 0.7071 0 -0.7071 0.7071 1 -0.7071 0.9239 0 -0.3827 0.3827 0 -0.9239
  [5,24,0.7071,0,-0.7071,0.7071,1,-0.7071,0.9239,0,-0.3827,0.3827,0,-0.9239],
// 4 16 0.9239 1 -0.3827 1 1 0 1 0 0 0.9239 0 -0.3827
  [4,16,0.9239,1,-0.3827,1,1,0,1,0,0,0.9239,0,-0.3827],
// 5 24 0.9239 0 -0.3827 0.9239 1 -0.3827 1 0 0 0.7071 0 -0.7071
  [5,24,0.9239,0,-0.3827,0.9239,1,-0.3827,1,0,0,0.7071,0,-0.7071],
// 0
];
module ldraw_lib__4_4cyli(step=0, col=false, unit=2/5, alt=false, line=0.2, solid=!$preview)
    makepoly(ldraw_lib__4_4cyli(solid), step=step, col=col, unit=unit, alt=alt, line=line, solid=solid);
ldraw_lib__4_4cyli(line=0.2);
// file: 3004.scad
use <../lib.scad>
use <s/3004s01.scad>
$fa=1; $fs=0.2;
function ldraw_lib__3004(realsolid=false) = [
// 0 Brick  1 x  2
// 0 Name: 3004.dat
// 0 Author: James Jessiman
// 0 !LDRAW_ORG Part UPDATE 2022-05
// 0 !LICENSE Licensed under CC BY 2.0 and CC BY 4.0 : see CAreadme.txt
// 
// 0 BFC CERTIFY CCW
  [0,"BFC","CERTIFY"],
  [0,"BFC","CCW"],
// 
// 0 !HISTORY 2001-10-26 [PTadmin] Official Update 2001-01
// 0 !HISTORY 2002-05-07 {unknown} BFC Certification
// 0 !HISTORY 2002-06-11 [PTadmin] Official Update 2002-03
// 0 !HISTORY 2007-05-07 [PTadmin] Header formatted for Contributor Agreement
// 0 !HISTORY 2008-07-01 [PTadmin] Official Update 2008-01
// 0 !HISTORY 2022-08-04 [MagFors] Using subfile
// 0 !HISTORY 2022-09-15 [PTadmin] Official Update 2022-05
// 
// 
// 1 16 0 0 0 1 0 0 0 1 0 0 0 1 s\3004s01.dat
  [1,16,0,0,0,1,0,0,0,1,0,0,0,1, ldraw_lib__s__3004s01(realsolid)],
// 4 16 -20 24 -10 20 24 -10 20 0 -10 -20 0 -10
  [4,16,-20,24,-10,20,24,-10,20,0,-10,-20,0,-10],
];
module ldraw_lib__3004(step=0, col=false, unit=2/5, alt=false, line=0.2, solid=!$preview)
    makepoly(ldraw_lib__3004(solid), step=step, col=col, unit=unit, alt=alt, line=line, solid=solid);
ldraw_lib__3004(line=0.2);
// file: ../p/connhole.scad
use <../lib.scad>
use <4-4cyli.scad>
use <4-4ring8.scad>
use <peghole.scad>
$fa=1; $fs=0.2;
function ldraw_lib__connhole(realsolid=false) = [
// 0 Technic Connector Hole Long
// 0 Name: connhole.dat
// 0 Author: Thomas Woelk [t.woelk]
// 0 !LDRAW_ORG Primitive UPDATE 2009-02
// 0 !LICENSE Licensed under CC BY 2.0 and CC BY 4.0 : see CAreadme.txt
// 
// 0 BFC CERTIFY CCW
  [0,"BFC","CERTIFY"],
  [0,"BFC","CCW"],
// 
// 0 !HISTORY 2005-07-09 [mikeheide] use 4-4ring8 primitive
// 0 !HISTORY 2009-09-03 [PTadmin] Official Update 2009-02
// 
// 
// 1 16 0 -10 0 1 0 0 0 1 0 0 0 1 peghole.dat
  [1,16,0,-10,0,1,0,0,0,1,0,0,0,1, ldraw_lib__peghole(realsolid)],
// 1 16 0 10 0 1 0 0 0 -1 0 0 0 1 peghole.dat
  [1,16,0,10,0,1,0,0,0,-1,0,0,0,1, ldraw_lib__peghole(realsolid)],
// 0 BFC INVERTNEXT
  [0,"BFC","INVERTNEXT"],
// 1 16 0 -8 0 6 0 0 0 16 0 0 0 6 4-4cyli.dat
  [1,16,0,-8,0,6,0,0,0,16,0,0,0,6, ldraw_lib__4_4cyli(realsolid)],
// 1 16 0 -10 0 1 0 0 0 1 0 0 0 1 4-4ring8.dat
  [1,16,0,-10,0,1,0,0,0,1,0,0,0,1, ldraw_lib__4_4ring8(realsolid)],
// 1 16 0 10 0 1 0 0 0 -1 0 0 0 -1 4-4ring8.dat
  [1,16,0,10,0,1,0,0,0,-1,0,0,0,-1, ldraw_lib__4_4ring8(realsolid)],
// 0
];
module ldraw_lib__connhole(step=0, col=false, unit=2/5, alt=false, line=0.2, solid=!$preview)
    makepoly(ldraw_lib__connhole(solid), step=step, col=col, unit=unit, alt=alt, line=line, solid=solid);
ldraw_lib__connhole(line=0.2);
// file: ../p/4-4cylo.scad
use <../lib.scad>
use <4-4cyli.scad>
use <4-4edge.scad>
$fa=1; $fs=0.2;
function ldraw_lib__4_4cylo(realsolid=false) = [
// 0 Cylinder Open 1.0
// 0 Name: 4-4cylo.dat
// 0 Author: Mark Kennedy [mkennedy]
// 0 !LDRAW_ORG Primitive UPDATE 2010-01
// 0 !LICENSE Licensed under CC BY 2.0 and CC BY 4.0 : see CAreadme.txt
// 
// 0 BFC CERTIFY CCW
  [0,"BFC","CERTIFY"],
  [0,"BFC","CCW"],
// 
// 0 !HISTORY 2010-04-05 [PTadmin] Official Update 2010-01
// 
// 
// 1 16 0 0 0 1 0 0 0 1 0 0 0 1 4-4edge.dat
  [1,16,0,0,0,1,0,0,0,1,0,0,0,1, ldraw_lib__4_4edge(realsolid)],
// 1 16 0 1 0 1 0 0 0 1 0 0 0 1 4-4edge.dat
  [1,16,0,1,0,1,0,0,0,1,0,0,0,1, ldraw_lib__4_4edge(realsolid)],
// 1 16 0 0 0 1 0 0 0 1 0 0 0 1 4-4cyli.dat
  [1,16,0,0,0,1,0,0,0,1,0,0,0,1, ldraw_lib__4_4cyli(realsolid)],
// 0
];
module ldraw_lib__4_4cylo(step=0, col=false, unit=2/5, alt=false, line=0.2, solid=!$preview)
    makepoly(ldraw_lib__4_4cylo(solid), step=step, col=col, unit=unit, alt=alt, line=line, solid=solid);
ldraw_lib__4_4cylo(line=0.2);
// main file
use <../lib.scad>
use <../p/4-4cylo.scad>
use <../p/connhole.scad>
$fa=1; $fs=0.2;
function ldraw_lib__18654(realsolid=false) = [
// 0 Technic Beam  1
// 0 Name: 18654.dat
// 0 Author: Owen Burgoyne [C3POwen]
// 0 !LDRAW_ORG Part UPDATE 2015-01
// 0 !LICENSE Licensed under CC BY 2.0 and CC BY 4.0 : see CAreadme.txt
// 
// 0 BFC CERTIFY CCW
  [0,"BFC","CERTIFY"],
  [0,"BFC","CCW"],
// 
// 0 !HISTORY 2015-10-11 [PTadmin] Official Update 2015-01
// 
// 
// 1 16 0 0 0 1 0 0 0 1 0 0 0 1 connhole.dat
  [1,16,0,0,0,1,0,0,0,1,0,0,0,1, ldraw_lib__connhole(realsolid)],
// 1 16 0 -10 0 9 0 0 0 20 0 0 0 9 4-4cylo.dat
  [1,16,0,-10,0,9,0,0,0,20,0,0,0,9, ldraw_lib__4_4cylo(realsolid)],
];
module ldraw_lib__18654(step=0, col=false, unit=2/5, alt=false, line=0.2, solid=!$preview)
    makepoly(ldraw_lib__18654(solid), step=step, col=col, unit=unit, alt=alt, line=line, solid=solid);
ldraw_lib__18654(line=0.2);
